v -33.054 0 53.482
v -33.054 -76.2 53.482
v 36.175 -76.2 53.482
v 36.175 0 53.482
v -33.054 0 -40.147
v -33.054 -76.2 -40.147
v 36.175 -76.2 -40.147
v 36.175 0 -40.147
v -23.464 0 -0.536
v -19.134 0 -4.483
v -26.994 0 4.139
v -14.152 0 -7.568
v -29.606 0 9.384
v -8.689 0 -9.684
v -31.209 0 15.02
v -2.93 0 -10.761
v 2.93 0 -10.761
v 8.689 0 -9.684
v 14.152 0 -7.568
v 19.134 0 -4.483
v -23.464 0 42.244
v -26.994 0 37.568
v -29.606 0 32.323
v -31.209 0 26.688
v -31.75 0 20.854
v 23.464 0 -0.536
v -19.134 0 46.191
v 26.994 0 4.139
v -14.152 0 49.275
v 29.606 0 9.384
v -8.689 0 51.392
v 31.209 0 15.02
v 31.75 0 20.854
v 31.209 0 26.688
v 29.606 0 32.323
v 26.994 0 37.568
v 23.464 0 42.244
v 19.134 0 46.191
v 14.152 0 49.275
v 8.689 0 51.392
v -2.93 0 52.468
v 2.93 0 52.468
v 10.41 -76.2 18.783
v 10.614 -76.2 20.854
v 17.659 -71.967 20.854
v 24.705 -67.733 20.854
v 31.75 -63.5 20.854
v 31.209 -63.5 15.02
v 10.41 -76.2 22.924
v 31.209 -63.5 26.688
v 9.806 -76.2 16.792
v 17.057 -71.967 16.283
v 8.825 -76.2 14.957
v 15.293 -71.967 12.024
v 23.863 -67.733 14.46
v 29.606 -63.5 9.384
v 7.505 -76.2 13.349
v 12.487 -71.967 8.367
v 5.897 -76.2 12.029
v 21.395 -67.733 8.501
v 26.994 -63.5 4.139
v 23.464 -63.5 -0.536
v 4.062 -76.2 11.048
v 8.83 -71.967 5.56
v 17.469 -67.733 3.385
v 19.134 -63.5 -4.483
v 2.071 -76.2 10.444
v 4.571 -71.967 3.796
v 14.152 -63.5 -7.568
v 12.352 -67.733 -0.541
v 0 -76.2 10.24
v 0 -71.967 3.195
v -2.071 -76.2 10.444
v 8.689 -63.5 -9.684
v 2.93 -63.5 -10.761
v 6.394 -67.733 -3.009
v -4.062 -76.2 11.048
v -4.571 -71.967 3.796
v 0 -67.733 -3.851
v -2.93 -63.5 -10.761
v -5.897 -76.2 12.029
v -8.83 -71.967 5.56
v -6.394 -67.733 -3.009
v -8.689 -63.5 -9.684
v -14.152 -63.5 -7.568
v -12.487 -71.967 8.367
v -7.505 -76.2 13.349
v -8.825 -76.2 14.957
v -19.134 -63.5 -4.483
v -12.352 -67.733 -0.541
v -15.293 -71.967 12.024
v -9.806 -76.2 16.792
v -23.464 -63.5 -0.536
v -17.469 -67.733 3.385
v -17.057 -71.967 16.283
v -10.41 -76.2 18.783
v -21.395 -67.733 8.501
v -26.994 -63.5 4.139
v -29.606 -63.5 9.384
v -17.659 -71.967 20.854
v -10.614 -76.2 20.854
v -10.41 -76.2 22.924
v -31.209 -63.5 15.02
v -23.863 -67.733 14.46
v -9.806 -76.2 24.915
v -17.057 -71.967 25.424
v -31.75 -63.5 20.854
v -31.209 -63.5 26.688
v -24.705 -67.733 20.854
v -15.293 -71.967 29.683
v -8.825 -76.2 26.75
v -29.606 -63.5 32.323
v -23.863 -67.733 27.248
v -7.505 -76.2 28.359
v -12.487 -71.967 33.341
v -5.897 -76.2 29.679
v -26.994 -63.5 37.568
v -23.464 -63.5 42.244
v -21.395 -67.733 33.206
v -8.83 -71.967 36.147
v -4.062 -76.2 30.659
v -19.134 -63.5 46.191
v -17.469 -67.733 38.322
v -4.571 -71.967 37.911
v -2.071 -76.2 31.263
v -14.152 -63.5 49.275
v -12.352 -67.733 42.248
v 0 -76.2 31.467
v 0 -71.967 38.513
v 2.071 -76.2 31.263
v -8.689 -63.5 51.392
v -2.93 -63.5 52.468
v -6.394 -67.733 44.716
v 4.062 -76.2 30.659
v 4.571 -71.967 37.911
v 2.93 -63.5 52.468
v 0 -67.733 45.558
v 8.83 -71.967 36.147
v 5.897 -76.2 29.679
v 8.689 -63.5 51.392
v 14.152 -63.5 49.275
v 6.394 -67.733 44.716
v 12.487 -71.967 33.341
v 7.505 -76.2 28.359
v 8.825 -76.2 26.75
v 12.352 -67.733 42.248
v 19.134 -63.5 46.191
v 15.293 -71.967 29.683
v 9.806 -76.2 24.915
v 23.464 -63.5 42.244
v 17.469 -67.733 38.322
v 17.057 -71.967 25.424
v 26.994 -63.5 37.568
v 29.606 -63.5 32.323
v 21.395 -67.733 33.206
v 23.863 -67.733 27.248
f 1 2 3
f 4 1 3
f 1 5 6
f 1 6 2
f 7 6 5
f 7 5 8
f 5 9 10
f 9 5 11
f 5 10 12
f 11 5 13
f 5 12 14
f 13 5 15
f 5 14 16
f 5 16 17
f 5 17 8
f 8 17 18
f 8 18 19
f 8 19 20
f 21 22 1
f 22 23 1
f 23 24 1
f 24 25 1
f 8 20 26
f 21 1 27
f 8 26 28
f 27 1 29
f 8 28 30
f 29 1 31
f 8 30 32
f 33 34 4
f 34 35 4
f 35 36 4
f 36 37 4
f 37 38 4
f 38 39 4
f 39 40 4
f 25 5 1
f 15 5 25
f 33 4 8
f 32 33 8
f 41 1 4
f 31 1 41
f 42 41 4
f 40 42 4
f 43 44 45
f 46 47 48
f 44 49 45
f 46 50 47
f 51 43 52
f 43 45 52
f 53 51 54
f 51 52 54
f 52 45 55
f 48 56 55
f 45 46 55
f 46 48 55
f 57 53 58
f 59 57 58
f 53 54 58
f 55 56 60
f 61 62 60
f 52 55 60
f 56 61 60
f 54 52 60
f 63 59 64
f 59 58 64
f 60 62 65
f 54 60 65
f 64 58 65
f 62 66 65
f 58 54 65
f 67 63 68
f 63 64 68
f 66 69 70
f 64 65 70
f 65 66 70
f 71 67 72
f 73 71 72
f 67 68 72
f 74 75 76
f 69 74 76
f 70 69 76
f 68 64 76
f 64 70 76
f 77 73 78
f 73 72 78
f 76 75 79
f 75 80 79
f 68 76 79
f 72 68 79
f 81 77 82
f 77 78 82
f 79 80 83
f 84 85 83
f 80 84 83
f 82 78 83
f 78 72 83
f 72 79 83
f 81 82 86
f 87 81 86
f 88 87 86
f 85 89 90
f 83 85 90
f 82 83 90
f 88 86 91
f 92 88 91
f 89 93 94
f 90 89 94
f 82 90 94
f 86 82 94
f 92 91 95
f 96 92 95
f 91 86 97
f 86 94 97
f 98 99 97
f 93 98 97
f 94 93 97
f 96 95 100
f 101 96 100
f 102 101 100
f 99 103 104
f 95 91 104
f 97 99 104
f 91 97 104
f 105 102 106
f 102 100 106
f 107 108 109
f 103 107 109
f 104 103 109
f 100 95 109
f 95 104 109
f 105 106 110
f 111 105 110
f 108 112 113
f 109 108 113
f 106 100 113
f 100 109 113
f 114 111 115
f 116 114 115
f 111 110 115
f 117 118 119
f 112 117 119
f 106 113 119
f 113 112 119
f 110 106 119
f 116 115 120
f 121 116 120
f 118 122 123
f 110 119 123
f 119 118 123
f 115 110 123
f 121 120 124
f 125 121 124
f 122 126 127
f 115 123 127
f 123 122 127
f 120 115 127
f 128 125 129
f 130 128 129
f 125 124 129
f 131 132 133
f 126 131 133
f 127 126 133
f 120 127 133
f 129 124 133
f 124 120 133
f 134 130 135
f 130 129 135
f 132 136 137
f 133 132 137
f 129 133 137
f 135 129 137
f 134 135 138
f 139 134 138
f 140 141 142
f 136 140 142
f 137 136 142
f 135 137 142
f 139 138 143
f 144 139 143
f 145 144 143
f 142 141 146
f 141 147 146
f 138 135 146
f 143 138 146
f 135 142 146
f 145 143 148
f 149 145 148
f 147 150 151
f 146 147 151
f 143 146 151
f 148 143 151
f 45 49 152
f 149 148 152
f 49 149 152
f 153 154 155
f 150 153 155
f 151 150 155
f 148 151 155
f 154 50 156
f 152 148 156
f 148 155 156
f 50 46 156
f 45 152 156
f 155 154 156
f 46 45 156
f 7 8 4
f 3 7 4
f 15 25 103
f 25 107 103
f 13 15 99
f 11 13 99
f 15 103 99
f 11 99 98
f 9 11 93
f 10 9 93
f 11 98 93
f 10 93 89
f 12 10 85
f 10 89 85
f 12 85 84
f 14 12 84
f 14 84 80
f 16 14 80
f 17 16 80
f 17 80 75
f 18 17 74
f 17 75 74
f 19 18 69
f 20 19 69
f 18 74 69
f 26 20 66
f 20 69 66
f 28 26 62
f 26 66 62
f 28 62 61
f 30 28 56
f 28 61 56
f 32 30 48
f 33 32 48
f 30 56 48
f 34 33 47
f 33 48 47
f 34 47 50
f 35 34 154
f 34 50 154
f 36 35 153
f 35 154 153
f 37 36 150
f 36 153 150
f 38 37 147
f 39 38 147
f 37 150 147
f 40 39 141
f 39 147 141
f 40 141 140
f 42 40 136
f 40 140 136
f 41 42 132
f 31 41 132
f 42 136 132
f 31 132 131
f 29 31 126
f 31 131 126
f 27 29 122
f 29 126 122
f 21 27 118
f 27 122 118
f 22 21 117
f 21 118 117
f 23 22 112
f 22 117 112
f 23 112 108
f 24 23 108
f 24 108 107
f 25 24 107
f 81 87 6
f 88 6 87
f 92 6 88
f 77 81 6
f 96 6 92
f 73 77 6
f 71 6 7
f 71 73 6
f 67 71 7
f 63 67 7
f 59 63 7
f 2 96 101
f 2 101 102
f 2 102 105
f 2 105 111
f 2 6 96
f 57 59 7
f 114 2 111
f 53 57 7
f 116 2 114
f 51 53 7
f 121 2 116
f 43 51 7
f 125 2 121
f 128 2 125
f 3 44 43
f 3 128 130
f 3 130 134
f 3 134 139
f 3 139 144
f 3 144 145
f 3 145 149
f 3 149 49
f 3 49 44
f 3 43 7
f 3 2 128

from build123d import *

# Parameters (mm, degrees)
F0_W     = 69.2285113037
F0_H     = 93.6287268996
F2_DEPTH = 76.2
F3_D     = 63.5
F3_DEPTH = 63.5
F3_TIP   = 19.0773246541


with BuildPart() as f2:
    # F0 (on Front) → F2 (new body)
    with BuildSketch(Plane.XZ):
        with Locations((1.5604775399, 6.6675022244)):
            Rectangle(F0_W, F0_H)
    extrude(amount=F2_DEPTH)

    # F3
    with Locations(Plane(origin=(0, 0, 0), x_dir=(1, 0, 0), z_dir=(0, 1, 0))):
        with Locations((0, -20.853670314)):
            Hole(F3_D / 2, depth=F3_DEPTH)
            with Locations((0, 0, -(F3_DEPTH + F3_TIP / 2))):  # 118° drill point
                Cone(0, F3_D / 2, F3_TIP, mode=Mode.SUBTRACT)


solid = f2.part
